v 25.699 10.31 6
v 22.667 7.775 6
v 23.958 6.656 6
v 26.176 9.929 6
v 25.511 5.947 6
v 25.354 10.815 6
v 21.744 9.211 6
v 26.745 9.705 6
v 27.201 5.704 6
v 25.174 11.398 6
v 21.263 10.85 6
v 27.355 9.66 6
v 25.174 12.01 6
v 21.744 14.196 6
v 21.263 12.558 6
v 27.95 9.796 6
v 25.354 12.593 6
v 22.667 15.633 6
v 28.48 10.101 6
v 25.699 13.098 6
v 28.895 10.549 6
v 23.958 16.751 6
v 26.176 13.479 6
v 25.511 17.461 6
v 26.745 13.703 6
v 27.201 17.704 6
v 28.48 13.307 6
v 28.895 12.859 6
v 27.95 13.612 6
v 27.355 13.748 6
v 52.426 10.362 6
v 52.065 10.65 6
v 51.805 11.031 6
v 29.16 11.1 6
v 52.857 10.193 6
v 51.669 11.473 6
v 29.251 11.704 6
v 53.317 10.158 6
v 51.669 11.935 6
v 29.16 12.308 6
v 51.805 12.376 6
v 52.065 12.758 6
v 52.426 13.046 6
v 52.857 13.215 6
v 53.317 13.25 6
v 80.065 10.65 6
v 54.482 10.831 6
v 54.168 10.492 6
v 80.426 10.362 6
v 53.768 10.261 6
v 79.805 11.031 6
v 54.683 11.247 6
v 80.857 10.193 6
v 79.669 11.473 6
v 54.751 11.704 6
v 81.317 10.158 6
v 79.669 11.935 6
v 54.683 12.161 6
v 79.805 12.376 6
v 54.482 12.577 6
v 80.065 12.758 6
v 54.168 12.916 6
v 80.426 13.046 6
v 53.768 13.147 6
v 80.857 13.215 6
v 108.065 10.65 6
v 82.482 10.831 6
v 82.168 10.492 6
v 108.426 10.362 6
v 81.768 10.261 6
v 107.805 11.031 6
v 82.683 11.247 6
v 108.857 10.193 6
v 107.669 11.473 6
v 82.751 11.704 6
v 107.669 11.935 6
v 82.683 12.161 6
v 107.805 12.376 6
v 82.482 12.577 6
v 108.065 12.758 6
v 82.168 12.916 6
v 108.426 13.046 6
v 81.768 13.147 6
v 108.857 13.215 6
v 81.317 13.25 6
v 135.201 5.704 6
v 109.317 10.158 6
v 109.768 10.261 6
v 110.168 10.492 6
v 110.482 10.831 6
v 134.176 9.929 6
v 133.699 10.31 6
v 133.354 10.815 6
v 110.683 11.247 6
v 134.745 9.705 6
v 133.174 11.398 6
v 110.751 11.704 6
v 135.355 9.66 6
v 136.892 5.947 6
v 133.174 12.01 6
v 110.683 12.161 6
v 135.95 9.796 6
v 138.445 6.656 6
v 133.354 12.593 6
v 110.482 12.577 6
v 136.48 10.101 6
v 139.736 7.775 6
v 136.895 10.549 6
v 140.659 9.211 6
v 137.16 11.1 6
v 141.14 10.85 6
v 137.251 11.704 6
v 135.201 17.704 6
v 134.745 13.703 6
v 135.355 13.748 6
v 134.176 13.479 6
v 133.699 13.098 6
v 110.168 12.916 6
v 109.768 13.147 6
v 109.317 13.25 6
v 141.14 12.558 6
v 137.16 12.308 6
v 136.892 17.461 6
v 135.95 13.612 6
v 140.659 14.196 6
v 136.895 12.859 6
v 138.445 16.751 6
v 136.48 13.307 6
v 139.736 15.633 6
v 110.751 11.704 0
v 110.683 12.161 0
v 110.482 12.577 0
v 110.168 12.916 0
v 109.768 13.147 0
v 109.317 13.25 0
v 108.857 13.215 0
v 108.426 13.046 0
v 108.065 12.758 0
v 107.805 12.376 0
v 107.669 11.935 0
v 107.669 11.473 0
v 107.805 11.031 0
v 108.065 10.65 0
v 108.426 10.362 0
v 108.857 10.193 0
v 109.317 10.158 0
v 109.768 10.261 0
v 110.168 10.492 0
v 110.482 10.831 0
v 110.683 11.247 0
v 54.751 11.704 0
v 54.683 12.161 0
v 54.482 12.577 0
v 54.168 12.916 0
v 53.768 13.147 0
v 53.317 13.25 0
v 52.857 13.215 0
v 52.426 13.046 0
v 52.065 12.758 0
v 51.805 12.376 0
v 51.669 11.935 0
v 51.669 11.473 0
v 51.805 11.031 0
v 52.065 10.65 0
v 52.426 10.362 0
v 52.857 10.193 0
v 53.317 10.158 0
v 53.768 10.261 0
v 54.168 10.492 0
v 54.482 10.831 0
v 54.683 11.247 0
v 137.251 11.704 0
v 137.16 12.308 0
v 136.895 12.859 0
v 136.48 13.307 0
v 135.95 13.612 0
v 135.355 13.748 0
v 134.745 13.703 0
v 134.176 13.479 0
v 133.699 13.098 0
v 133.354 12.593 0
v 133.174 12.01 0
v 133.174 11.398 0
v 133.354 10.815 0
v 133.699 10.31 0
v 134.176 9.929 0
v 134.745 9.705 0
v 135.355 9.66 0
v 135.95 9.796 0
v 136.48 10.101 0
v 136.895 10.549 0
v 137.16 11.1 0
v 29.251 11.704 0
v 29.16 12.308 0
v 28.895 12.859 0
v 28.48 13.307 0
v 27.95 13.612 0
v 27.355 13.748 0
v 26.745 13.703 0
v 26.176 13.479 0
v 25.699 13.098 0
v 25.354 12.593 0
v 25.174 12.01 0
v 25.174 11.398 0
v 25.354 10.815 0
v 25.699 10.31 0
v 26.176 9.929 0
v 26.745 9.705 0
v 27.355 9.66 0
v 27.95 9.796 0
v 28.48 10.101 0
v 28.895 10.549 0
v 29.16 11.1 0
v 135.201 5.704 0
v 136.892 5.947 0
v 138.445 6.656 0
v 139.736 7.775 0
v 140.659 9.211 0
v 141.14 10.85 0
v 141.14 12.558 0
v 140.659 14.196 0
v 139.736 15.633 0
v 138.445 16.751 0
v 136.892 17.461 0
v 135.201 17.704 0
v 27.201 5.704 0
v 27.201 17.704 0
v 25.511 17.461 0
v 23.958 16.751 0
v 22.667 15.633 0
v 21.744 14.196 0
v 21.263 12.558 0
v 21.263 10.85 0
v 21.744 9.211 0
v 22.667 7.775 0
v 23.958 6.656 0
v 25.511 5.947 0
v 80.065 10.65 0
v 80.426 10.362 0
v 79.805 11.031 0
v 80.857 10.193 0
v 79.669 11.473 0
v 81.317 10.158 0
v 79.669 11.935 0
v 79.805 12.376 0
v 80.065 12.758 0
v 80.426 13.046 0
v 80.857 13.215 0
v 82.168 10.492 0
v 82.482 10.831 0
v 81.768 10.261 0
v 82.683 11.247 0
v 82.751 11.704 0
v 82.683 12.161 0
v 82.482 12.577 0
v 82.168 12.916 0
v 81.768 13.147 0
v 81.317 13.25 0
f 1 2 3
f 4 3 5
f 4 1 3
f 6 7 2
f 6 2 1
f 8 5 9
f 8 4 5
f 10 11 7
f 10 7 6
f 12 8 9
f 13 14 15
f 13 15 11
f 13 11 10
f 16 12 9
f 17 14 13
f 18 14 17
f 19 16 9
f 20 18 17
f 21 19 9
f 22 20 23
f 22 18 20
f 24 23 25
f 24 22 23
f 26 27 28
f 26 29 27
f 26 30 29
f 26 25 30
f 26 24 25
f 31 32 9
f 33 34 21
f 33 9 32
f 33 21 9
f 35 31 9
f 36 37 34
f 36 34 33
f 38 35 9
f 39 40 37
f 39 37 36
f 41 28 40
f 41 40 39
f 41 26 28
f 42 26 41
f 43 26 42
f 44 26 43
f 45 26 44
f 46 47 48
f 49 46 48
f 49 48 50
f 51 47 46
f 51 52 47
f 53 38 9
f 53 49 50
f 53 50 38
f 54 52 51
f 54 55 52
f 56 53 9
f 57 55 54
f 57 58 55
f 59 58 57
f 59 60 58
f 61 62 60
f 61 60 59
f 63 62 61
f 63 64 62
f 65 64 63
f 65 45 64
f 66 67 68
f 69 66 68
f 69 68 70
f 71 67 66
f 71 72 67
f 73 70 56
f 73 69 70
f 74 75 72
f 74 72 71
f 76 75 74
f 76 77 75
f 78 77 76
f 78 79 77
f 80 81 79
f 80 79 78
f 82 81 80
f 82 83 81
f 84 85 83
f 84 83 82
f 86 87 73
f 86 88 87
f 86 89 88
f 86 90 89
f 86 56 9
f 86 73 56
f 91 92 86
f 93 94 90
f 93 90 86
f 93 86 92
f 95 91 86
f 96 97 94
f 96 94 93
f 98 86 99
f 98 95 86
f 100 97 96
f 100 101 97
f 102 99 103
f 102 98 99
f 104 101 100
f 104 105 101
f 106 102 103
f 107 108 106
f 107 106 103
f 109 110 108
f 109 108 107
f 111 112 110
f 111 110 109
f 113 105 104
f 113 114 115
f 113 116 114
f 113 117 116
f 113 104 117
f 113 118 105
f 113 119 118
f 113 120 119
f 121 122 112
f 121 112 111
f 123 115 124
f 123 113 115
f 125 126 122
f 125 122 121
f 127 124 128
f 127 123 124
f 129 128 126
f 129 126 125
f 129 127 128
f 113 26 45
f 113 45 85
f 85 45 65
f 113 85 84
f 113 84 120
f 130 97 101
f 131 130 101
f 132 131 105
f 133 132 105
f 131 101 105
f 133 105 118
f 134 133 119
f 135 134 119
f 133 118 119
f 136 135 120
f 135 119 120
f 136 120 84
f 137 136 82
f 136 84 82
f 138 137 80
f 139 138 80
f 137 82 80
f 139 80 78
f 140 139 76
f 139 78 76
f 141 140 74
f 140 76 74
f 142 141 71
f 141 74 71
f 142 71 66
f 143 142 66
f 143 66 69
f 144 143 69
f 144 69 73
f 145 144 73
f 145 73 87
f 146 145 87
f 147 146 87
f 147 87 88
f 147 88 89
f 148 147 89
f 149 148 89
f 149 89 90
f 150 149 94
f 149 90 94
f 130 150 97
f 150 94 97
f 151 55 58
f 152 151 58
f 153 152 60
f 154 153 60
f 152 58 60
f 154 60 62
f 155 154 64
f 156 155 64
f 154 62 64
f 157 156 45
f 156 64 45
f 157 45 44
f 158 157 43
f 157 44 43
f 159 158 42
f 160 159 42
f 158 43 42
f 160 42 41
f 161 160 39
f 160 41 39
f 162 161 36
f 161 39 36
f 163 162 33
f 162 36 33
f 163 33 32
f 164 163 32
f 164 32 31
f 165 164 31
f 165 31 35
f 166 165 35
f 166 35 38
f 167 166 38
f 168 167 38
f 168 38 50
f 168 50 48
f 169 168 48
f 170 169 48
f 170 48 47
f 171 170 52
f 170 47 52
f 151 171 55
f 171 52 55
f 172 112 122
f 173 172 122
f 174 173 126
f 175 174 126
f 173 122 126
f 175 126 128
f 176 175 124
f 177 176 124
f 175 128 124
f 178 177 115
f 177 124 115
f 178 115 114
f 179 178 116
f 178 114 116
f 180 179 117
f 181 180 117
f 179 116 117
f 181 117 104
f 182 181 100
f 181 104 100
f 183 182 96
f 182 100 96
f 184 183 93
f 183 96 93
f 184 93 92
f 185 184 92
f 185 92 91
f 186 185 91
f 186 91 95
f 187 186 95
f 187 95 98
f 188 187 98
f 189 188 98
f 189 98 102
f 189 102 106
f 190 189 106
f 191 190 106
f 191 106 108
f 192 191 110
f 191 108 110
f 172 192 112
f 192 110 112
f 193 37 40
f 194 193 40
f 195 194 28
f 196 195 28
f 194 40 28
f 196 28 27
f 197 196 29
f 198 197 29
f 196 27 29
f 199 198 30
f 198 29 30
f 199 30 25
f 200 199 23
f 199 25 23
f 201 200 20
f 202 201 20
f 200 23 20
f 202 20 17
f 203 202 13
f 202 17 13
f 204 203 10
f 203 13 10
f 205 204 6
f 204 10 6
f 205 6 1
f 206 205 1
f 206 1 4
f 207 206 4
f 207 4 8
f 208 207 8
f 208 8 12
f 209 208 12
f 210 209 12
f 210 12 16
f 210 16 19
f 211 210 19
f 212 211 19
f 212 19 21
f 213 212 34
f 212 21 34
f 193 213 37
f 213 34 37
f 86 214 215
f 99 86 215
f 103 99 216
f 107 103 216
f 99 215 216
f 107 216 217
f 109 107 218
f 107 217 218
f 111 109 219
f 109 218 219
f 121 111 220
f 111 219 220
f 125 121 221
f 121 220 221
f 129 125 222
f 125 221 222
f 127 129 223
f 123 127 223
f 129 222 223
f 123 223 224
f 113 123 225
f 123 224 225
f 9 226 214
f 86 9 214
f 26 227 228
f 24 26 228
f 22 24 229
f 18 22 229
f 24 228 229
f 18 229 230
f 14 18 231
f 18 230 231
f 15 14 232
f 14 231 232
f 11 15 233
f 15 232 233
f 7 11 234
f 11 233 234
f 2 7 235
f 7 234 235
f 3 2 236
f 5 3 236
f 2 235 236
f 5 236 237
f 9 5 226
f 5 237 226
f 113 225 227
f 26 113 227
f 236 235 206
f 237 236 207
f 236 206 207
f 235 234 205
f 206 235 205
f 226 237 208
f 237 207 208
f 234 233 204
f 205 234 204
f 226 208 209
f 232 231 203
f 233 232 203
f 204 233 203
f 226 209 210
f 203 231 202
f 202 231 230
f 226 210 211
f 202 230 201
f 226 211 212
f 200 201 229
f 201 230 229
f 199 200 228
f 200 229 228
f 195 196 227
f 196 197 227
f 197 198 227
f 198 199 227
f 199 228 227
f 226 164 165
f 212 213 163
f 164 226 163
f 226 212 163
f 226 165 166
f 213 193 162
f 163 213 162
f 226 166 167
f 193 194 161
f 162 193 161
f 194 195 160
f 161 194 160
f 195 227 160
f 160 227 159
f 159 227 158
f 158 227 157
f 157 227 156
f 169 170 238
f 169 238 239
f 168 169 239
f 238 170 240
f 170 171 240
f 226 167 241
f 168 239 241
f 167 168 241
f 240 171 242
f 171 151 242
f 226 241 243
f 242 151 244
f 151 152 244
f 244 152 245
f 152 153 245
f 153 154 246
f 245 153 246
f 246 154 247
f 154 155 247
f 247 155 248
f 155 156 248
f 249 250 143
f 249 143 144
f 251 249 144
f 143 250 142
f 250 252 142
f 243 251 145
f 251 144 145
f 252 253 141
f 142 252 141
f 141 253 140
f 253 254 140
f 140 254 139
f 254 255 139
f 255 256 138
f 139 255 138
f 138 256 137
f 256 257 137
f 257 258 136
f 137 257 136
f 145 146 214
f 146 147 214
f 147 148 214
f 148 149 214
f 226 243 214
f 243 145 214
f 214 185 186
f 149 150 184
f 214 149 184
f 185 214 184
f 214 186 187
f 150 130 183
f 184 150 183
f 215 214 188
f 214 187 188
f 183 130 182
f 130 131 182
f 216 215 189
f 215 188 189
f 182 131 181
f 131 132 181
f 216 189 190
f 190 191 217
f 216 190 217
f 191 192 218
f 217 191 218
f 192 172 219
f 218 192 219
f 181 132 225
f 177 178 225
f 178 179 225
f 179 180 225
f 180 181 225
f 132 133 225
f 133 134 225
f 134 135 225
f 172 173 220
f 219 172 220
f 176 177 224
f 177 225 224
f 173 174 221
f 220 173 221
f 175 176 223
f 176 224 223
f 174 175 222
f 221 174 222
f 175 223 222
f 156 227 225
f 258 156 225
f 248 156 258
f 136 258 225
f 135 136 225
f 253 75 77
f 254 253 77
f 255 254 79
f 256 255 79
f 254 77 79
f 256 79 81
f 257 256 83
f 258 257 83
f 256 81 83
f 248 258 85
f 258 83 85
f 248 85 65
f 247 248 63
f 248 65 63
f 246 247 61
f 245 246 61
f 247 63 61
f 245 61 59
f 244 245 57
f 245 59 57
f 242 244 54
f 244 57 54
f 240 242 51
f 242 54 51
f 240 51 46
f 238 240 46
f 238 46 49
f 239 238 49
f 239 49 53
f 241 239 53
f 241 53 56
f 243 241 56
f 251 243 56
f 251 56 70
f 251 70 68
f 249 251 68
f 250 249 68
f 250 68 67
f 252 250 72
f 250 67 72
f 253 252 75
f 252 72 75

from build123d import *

# Parameters (mm, degrees)
DODANIE_WYCI_GNI_CIE1_DEPTH = 6
SZKIC2_R                    = 2.05
WYTNIJ_WYCI_GNI_CIE1_DEPTH  = 6
SZKIC3_R                    = 1.55
WYTNIJ_WYCI_GNI_CIE2_DEPTH  = 6


with BuildPart() as part:
    # Szkic1 → Dodanie-wyciągnięcie1 (new body)
    with BuildSketch(Plane.XY):
        with BuildLine():
            Line((135.201456632, 17.703969636), (27.201456632, 17.703969636))
            ThreePointArc((27.201456632, 17.703969636), (21.201456632, 11.703969636), (27.201456632, 5.703969636))
            Line((27.201456632, 5.703969636), (135.201456632, 5.703969636))
            ThreePointArc((135.201456632, 5.703969636), (141.201456632, 11.703969636), (135.201456632, 17.703969636))
        make_face()
    extrude(amount=DODANIE_WYCI_GNI_CIE1_DEPTH)

    # Szkic2 → Wytnij-wyciągnięcie1 (cut)
    with BuildSketch(Plane.XY.offset(6)):
        with Locations((135.201456632, 11.703969636)):
            Circle(SZKIC2_R)
        with Locations((27.201456632, 11.703969636)):
            Circle(SZKIC2_R)
    extrude(amount=-WYTNIJ_WYCI_GNI_CIE1_DEPTH, mode=Mode.SUBTRACT)

    # Szkic3 → Wytnij-wyciągnięcie2 (cut)
    with BuildSketch(Plane.XY.offset(6)):
        with Locations((53.201456632, 11.703969636)):
            Circle(SZKIC3_R)
        with Locations((81.201456632, 11.703969636)):
            Circle(SZKIC3_R)
        with Locations((109.201456632, 11.703969636)):
            Circle(SZKIC3_R)
    extrude(amount=-WYTNIJ_WYCI_GNI_CIE2_DEPTH, mode=Mode.SUBTRACT)


solid = part.part
